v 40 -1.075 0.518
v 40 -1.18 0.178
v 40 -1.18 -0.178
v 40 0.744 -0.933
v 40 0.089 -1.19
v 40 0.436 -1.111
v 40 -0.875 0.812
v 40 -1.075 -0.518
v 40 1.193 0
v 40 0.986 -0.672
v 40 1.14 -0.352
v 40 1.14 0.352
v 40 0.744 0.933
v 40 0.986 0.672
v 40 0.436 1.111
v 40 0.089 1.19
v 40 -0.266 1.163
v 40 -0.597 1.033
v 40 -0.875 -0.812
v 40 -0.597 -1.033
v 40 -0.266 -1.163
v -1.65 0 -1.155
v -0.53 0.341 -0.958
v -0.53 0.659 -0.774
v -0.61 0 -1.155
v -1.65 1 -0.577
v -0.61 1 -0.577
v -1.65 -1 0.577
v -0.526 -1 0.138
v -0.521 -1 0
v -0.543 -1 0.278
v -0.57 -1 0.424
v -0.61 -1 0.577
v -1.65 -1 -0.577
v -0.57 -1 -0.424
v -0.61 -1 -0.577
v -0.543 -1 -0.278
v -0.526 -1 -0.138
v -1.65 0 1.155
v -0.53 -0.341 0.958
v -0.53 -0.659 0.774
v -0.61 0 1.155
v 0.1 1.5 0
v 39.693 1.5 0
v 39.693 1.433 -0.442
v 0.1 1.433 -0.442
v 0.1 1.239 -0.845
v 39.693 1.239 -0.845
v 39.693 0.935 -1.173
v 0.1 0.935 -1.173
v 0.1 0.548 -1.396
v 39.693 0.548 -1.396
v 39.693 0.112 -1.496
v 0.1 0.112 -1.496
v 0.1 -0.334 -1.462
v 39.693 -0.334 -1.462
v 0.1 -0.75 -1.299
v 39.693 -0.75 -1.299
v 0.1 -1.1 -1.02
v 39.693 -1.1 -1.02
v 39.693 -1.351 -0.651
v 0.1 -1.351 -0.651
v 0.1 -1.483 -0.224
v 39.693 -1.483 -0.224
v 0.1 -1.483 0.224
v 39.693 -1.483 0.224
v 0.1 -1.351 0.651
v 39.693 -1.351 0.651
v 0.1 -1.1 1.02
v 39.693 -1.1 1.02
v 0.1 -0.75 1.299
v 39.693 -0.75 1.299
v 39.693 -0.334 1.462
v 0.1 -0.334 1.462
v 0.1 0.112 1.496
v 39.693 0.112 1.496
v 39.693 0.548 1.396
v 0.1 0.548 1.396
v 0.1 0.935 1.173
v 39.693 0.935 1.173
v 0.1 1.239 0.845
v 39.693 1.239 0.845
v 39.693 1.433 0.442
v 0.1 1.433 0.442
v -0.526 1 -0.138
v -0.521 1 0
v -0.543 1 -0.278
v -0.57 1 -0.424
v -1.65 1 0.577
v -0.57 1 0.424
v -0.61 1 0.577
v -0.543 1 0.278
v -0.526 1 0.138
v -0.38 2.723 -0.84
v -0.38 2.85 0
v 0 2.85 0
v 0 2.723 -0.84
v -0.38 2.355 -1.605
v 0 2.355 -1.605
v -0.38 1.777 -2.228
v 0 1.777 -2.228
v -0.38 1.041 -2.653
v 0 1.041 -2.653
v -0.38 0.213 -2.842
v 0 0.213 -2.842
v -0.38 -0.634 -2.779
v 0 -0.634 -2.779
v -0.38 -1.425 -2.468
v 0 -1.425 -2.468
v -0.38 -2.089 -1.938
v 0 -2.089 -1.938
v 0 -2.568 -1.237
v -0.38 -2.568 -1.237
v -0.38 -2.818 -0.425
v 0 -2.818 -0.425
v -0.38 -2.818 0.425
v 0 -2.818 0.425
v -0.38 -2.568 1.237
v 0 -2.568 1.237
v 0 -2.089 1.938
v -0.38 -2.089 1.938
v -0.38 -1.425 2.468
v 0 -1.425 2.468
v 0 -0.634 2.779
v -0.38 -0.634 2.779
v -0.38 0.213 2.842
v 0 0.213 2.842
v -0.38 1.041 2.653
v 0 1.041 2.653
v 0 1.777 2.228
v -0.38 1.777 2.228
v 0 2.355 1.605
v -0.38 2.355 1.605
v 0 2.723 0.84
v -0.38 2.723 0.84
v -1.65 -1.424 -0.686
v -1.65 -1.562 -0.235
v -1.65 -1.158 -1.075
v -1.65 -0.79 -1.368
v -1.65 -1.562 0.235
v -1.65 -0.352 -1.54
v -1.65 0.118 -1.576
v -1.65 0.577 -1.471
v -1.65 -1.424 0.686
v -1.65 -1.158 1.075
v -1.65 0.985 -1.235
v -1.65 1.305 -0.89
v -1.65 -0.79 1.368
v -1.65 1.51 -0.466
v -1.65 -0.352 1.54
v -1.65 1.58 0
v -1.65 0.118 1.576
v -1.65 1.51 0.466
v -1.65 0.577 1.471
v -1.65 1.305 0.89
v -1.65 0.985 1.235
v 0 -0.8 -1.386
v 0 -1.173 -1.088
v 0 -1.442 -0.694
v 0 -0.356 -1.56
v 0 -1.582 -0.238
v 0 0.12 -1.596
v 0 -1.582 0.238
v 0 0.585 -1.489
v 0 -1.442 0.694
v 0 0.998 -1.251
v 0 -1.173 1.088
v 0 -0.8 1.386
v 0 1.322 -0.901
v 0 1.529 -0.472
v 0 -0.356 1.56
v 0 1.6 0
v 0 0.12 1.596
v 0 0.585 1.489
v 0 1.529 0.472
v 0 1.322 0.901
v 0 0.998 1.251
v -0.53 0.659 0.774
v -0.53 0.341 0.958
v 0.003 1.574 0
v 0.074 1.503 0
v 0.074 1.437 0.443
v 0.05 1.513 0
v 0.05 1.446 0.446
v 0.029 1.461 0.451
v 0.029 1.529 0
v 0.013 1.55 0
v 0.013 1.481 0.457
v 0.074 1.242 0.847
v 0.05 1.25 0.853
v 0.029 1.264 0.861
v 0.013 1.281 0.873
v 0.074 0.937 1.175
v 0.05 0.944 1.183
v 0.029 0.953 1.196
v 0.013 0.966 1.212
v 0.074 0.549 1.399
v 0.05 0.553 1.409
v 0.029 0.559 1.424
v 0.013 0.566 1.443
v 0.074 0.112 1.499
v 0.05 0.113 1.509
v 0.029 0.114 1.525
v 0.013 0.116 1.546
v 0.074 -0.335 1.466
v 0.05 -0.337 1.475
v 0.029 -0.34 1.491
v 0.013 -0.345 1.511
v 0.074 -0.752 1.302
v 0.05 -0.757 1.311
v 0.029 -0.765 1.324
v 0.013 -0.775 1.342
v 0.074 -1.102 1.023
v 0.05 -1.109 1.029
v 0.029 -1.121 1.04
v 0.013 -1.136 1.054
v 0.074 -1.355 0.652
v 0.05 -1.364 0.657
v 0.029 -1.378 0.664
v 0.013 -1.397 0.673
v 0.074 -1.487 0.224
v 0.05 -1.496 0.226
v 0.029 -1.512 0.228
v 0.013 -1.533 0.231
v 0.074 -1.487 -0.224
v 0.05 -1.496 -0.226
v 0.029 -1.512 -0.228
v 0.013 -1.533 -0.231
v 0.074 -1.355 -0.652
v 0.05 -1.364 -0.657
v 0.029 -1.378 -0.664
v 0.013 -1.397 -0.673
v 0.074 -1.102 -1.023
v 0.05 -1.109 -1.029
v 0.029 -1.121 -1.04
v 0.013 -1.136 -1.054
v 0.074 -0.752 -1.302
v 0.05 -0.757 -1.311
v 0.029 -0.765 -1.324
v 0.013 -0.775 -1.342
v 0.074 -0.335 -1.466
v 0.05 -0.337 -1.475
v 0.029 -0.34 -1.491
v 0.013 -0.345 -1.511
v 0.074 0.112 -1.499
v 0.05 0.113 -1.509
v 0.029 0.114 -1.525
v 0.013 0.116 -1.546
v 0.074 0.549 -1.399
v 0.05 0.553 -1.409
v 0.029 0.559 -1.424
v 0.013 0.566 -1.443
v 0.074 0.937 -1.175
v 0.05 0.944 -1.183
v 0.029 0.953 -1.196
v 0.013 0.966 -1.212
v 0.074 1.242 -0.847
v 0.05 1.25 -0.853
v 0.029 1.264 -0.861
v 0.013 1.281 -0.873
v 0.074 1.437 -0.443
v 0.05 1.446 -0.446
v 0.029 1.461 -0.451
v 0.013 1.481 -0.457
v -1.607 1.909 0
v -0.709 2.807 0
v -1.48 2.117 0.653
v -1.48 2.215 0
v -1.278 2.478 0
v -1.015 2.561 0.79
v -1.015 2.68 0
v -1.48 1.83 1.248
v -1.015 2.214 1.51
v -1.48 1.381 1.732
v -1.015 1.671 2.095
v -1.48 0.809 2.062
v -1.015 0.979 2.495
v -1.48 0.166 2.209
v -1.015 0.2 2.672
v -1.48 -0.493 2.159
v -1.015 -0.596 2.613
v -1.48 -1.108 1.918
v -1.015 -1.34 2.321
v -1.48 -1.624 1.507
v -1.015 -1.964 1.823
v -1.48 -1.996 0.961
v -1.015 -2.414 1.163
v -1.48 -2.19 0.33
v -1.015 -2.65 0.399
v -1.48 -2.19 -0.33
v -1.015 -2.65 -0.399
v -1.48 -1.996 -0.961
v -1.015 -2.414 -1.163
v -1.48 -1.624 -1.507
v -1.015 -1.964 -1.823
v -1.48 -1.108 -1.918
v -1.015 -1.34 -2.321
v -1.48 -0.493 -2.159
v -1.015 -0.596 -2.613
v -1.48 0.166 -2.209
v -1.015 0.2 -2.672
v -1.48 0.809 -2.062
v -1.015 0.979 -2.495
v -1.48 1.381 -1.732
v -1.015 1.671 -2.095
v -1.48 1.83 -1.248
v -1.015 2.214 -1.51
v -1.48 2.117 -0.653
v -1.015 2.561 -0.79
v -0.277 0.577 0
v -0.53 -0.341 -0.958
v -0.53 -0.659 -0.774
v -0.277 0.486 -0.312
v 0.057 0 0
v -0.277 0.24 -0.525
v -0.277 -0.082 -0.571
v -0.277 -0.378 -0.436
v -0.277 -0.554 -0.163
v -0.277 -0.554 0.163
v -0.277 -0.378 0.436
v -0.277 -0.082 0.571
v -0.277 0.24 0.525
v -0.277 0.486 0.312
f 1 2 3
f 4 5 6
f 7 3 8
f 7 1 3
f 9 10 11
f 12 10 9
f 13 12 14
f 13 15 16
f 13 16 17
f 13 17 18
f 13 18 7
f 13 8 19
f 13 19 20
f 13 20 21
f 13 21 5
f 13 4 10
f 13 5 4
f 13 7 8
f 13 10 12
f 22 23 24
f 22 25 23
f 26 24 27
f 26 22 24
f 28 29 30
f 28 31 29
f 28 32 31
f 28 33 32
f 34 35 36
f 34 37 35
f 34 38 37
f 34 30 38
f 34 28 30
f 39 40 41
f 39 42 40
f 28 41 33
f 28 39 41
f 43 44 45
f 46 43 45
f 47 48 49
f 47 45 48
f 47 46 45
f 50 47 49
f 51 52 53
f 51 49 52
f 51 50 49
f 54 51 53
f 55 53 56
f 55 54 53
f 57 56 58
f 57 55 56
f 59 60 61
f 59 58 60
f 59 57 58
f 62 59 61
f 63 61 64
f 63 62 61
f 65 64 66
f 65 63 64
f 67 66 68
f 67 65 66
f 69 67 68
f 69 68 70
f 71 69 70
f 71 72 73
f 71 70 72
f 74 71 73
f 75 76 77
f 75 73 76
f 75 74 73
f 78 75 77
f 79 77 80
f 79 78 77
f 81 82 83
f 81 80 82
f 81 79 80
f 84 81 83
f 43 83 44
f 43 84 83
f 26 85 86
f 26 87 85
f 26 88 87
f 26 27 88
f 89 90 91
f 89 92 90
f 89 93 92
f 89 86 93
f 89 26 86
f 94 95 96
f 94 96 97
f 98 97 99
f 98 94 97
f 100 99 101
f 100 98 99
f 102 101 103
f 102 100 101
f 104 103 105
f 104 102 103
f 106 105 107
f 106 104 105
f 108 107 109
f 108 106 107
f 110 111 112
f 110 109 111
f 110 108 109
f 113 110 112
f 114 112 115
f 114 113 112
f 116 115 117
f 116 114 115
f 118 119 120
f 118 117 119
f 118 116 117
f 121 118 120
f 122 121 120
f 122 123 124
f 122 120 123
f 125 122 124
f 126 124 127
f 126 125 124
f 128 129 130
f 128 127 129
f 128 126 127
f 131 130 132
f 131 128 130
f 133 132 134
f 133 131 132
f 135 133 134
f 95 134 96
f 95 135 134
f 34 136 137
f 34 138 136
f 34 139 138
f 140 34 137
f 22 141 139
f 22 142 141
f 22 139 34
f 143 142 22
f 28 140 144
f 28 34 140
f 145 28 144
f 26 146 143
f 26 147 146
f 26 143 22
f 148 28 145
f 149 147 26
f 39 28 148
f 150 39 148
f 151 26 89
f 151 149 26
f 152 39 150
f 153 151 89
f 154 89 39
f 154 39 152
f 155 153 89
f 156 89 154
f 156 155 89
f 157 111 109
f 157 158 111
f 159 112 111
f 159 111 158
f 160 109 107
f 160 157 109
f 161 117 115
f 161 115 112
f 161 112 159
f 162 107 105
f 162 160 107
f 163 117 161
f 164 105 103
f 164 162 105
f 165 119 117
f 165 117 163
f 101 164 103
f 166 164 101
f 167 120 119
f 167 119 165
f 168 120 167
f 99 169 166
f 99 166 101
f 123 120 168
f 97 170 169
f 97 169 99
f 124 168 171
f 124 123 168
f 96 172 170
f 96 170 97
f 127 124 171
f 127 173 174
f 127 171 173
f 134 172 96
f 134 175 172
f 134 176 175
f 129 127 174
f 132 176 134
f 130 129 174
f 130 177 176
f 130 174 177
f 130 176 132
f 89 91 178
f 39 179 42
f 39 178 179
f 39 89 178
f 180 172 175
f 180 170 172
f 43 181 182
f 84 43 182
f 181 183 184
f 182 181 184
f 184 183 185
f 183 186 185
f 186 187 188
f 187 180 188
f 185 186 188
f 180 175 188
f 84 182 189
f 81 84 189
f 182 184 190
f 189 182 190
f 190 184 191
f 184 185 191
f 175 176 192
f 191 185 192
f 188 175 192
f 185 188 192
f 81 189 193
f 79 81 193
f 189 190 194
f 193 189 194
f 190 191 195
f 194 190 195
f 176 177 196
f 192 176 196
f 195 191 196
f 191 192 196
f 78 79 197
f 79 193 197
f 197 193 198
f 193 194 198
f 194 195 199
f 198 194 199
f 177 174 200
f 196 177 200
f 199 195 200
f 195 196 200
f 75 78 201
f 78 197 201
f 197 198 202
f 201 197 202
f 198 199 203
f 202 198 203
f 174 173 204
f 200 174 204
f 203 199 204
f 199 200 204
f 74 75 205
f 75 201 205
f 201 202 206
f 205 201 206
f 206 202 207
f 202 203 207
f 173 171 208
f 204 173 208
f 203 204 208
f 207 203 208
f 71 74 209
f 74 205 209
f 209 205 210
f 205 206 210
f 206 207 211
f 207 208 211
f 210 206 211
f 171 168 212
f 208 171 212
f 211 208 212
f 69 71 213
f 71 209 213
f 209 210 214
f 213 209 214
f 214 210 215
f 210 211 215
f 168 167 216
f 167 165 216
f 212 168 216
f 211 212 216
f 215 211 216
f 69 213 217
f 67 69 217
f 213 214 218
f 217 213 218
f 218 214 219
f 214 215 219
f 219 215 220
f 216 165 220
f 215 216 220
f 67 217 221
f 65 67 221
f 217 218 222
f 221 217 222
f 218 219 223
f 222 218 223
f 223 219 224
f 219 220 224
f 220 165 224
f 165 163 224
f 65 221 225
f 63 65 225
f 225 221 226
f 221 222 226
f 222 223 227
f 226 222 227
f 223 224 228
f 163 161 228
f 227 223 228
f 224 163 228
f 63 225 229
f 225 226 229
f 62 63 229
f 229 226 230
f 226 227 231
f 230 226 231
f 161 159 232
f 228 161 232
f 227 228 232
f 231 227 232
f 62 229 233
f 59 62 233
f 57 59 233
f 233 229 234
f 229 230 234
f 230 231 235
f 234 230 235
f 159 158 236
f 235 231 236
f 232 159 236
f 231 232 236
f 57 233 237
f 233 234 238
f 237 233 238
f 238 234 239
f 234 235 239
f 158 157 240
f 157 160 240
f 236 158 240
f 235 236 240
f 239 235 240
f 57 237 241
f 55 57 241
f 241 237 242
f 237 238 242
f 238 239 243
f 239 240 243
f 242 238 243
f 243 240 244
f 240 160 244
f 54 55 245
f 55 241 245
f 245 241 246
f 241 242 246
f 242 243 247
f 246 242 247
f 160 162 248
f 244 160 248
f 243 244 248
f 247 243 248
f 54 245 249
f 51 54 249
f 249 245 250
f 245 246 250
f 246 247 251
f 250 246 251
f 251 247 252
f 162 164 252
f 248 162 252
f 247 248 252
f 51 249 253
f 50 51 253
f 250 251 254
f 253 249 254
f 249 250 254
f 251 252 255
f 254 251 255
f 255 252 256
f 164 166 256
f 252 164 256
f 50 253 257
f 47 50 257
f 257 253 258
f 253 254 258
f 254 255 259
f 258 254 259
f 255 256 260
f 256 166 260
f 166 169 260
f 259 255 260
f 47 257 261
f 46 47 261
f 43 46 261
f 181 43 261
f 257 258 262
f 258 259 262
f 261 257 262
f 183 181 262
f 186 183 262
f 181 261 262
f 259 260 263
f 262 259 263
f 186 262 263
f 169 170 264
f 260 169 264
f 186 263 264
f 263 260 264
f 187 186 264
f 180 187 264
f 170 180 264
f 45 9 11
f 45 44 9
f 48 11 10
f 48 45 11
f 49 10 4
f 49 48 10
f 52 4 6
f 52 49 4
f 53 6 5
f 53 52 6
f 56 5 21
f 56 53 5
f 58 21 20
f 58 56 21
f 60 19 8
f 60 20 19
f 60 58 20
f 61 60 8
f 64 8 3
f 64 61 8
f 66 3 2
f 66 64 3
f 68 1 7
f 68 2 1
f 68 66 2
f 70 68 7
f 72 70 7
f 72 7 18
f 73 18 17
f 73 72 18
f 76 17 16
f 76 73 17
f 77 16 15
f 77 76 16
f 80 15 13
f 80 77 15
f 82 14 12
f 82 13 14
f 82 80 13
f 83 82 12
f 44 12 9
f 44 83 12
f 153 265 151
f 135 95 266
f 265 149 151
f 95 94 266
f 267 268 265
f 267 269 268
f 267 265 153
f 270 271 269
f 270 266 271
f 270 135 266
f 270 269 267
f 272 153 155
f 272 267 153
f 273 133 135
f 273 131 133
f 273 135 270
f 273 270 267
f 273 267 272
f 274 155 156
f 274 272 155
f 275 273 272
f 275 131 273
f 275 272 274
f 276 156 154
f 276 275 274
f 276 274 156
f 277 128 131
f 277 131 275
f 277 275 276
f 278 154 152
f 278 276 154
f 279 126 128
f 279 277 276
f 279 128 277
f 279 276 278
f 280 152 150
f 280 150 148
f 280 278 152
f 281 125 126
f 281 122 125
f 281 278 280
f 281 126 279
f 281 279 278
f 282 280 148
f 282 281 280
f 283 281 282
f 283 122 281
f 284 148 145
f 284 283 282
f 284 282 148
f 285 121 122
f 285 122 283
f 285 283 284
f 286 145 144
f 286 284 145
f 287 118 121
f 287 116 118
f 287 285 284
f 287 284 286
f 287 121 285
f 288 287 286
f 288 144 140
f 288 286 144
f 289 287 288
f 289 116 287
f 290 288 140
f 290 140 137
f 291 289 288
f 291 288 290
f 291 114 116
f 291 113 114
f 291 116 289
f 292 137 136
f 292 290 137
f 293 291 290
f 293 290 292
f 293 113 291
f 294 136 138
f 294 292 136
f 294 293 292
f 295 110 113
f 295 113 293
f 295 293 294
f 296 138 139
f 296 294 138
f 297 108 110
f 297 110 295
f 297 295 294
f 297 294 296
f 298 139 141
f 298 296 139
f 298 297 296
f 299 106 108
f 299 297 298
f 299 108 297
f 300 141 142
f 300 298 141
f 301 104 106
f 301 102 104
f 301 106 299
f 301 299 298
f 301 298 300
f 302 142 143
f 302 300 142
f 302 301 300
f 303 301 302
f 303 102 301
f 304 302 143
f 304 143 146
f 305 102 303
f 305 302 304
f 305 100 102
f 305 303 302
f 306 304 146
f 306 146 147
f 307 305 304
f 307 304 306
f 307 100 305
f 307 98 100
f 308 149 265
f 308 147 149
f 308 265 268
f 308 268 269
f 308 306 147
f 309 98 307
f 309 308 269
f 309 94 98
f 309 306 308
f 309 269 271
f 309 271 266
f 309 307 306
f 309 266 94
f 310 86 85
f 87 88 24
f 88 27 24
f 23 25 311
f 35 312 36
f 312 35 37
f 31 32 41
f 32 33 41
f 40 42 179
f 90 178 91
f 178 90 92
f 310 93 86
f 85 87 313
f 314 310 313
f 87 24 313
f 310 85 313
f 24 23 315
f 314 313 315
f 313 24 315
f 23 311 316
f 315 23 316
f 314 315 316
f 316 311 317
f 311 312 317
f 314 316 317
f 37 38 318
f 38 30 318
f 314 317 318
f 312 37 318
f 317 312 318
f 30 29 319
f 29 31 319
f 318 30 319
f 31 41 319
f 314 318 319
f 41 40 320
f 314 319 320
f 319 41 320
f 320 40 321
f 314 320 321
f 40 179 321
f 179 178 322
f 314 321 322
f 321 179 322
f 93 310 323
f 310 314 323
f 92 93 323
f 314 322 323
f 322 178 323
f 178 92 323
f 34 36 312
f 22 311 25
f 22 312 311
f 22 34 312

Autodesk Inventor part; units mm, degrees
ref_plane "YZ Plane" through (0, 0, 0) normal (1, 0, 0) x (0, 1, 0)
ref_plane "XZ Plane" through (0, 0, 0) normal (0, 1, 0) x (-1, 0, 0)
sketch "Sketch1" plane through (0, 0, 0) normal (0, 0, 1) x (1, 0, 0)
  line L0 (0.0567, 0) -> (40, 0)
  line L1 (40, 0) -> (40, 1.5)
  line L2 (40, 1.5) -> (1, 1.5)
  line L3 (1, 1.5) -> (0.6933, 1.5)
  line L4 (0.6933, 1.5) -> (0, 1.5)
  line L5 (0, 1.5) -> (0, 2.85)
  line L6 (0, 2.85) -> (-1.65, 2.85)
  line L7 (-1.65, 2.85) -> (-1.65, 1.1547)
  line L8 (-1.65, 1.1547) -> (-0.61, 1.1547)
  line L9 (-0.61, 1.1547) -> (0.0567, 0)
  line L10 (-9.98, 0) -> (48.33, 0) projected
  line L11 (0, -0.57) -> (0, 3.42) projected
  line L12 (1, 1.5) -> (0, 1.5) construction
  dimension "d0" = 39
  dimension "d1" = 0.3067
  dimension "d2" = 1.65
  dimension "d3" = 1.04
  dimension "d4" = 60
  dimension "d5" = 3
  dimension "d6" = 3
  dimension "d7" = 2.3094
  dimension "d8" = 5.7
  dimension "d19" = 40
revolve "Body" add sketch "Sketch1" angle 360 about axis through (0.0567, 0, 0) along (1, 0, 0) contours L9 L11 L4 L3 L2 L1 L0 | L9 L8 L7 L6 L5 L11
sketch "Sketch2" plane through (-1.65, 0, 0) normal (-1, 0, 0) x (0, 0, 1)
  circle A0 centre (0, 0) radius 1.1547 projected
  line L0 (0, -3.99) -> (0, 3.99) projected
  line L1 (-3.99, 0) -> (3.99, 0) projected
  line L2 (1.1547, 0) -> (0.5774, -1)
  line L3 (0.5774, -1) -> (-0.5774, -1)
  line L4 (-0.5774, -1) -> (-1.1547, 0)
  line L5 (-1.1547, 0) -> (-0.5774, 1)
  line L6 (-0.5774, 1) -> (0.5774, 1)
  line L7 (0.5774, 1) -> (1.1547, 0)
extrude "Slot" add sketch "Sketch2" against normal up to next contours L7 A0 | A0 L2 | L6 L0 A0 | A0 L0 L3 | L0 L6 A0 | A0 L3 L0 | L4 A0 | A0 L5
fillet "Fillet1" radius 1.27 1 edges at (-1.65, -2.85, 0)
thread "Thread" size "M3x0.5" class "4g6g" standard "ANSI Metric M Profile" length 39
chamfer "Chamfer1" distance 0.3067 distance2 0.3067 1 edges at (40, -1.5, 0) measured on face at (40, -0.1088, 0.5667)
fillet "Fillet2" radius 0.1 1 edges at (0, -1.5, 0)
ref_plane "Work Plane1" through (30, 0, 0) normal (0, -0.5, 0.866) x (1, 0, 0)
equation "\"d16\" = RR"
equation "\"d12\" = GEL"
equation "\"d14\" = -0.5 * SPD + 0.5 * GD"
equation "\"d15\" = GUL"
equation "\"d29\" = R"
equation "\"d0\" = GEL"
equation "\"d1\" = GAL"
equation "\"d2\" = KOH"
equation "\"d3\" = INTI"
equation "\"d5\" = GD"
equation "\"d6\" = BDM"
equation "\"d7\" = 1.1547 * SW"
equation "\"d8\" = KOD"
equation "\"d19\" = NLG"
equation "\"GD\" = NND"
equation "\"NLG\" = 40"
equation "\"GEL\" = 39"
equation "\"KOD\" = 5.7"
equation "\"KOH\" = 1.65"
equation "\"INTI\" = 1.04"
equation "\"GAL\" = 0.61345 * PTC"
equation "\"GUL\" = 0.61345 * PTC"
equation "\"BDM\" = NND"
equation "\"SW\" = 2"
equation "\"RR\" = 1.27"
equation "\"SPD\" = 2.38655"
equation "\"d28\" = R"
equation "\"R\" = 0.1"
equation "\"TOA\" = 30deg"
equation "\"THREADDIA\" = 3"
equation "\"KOD1\" = KOD - 2 * RR"
equation "\"PTC\" = 0.5"
equation "\"NND\" = 3"
equation "\"E0\" = 1.155 * SW"
equation "\"GD1\" = THREADDIA - 1.2269 * PTC"
properties part number "ANSI B18.3.4M - M3 x 0.5 x 40, FHSBHCSM" material "Steel, Mild"
